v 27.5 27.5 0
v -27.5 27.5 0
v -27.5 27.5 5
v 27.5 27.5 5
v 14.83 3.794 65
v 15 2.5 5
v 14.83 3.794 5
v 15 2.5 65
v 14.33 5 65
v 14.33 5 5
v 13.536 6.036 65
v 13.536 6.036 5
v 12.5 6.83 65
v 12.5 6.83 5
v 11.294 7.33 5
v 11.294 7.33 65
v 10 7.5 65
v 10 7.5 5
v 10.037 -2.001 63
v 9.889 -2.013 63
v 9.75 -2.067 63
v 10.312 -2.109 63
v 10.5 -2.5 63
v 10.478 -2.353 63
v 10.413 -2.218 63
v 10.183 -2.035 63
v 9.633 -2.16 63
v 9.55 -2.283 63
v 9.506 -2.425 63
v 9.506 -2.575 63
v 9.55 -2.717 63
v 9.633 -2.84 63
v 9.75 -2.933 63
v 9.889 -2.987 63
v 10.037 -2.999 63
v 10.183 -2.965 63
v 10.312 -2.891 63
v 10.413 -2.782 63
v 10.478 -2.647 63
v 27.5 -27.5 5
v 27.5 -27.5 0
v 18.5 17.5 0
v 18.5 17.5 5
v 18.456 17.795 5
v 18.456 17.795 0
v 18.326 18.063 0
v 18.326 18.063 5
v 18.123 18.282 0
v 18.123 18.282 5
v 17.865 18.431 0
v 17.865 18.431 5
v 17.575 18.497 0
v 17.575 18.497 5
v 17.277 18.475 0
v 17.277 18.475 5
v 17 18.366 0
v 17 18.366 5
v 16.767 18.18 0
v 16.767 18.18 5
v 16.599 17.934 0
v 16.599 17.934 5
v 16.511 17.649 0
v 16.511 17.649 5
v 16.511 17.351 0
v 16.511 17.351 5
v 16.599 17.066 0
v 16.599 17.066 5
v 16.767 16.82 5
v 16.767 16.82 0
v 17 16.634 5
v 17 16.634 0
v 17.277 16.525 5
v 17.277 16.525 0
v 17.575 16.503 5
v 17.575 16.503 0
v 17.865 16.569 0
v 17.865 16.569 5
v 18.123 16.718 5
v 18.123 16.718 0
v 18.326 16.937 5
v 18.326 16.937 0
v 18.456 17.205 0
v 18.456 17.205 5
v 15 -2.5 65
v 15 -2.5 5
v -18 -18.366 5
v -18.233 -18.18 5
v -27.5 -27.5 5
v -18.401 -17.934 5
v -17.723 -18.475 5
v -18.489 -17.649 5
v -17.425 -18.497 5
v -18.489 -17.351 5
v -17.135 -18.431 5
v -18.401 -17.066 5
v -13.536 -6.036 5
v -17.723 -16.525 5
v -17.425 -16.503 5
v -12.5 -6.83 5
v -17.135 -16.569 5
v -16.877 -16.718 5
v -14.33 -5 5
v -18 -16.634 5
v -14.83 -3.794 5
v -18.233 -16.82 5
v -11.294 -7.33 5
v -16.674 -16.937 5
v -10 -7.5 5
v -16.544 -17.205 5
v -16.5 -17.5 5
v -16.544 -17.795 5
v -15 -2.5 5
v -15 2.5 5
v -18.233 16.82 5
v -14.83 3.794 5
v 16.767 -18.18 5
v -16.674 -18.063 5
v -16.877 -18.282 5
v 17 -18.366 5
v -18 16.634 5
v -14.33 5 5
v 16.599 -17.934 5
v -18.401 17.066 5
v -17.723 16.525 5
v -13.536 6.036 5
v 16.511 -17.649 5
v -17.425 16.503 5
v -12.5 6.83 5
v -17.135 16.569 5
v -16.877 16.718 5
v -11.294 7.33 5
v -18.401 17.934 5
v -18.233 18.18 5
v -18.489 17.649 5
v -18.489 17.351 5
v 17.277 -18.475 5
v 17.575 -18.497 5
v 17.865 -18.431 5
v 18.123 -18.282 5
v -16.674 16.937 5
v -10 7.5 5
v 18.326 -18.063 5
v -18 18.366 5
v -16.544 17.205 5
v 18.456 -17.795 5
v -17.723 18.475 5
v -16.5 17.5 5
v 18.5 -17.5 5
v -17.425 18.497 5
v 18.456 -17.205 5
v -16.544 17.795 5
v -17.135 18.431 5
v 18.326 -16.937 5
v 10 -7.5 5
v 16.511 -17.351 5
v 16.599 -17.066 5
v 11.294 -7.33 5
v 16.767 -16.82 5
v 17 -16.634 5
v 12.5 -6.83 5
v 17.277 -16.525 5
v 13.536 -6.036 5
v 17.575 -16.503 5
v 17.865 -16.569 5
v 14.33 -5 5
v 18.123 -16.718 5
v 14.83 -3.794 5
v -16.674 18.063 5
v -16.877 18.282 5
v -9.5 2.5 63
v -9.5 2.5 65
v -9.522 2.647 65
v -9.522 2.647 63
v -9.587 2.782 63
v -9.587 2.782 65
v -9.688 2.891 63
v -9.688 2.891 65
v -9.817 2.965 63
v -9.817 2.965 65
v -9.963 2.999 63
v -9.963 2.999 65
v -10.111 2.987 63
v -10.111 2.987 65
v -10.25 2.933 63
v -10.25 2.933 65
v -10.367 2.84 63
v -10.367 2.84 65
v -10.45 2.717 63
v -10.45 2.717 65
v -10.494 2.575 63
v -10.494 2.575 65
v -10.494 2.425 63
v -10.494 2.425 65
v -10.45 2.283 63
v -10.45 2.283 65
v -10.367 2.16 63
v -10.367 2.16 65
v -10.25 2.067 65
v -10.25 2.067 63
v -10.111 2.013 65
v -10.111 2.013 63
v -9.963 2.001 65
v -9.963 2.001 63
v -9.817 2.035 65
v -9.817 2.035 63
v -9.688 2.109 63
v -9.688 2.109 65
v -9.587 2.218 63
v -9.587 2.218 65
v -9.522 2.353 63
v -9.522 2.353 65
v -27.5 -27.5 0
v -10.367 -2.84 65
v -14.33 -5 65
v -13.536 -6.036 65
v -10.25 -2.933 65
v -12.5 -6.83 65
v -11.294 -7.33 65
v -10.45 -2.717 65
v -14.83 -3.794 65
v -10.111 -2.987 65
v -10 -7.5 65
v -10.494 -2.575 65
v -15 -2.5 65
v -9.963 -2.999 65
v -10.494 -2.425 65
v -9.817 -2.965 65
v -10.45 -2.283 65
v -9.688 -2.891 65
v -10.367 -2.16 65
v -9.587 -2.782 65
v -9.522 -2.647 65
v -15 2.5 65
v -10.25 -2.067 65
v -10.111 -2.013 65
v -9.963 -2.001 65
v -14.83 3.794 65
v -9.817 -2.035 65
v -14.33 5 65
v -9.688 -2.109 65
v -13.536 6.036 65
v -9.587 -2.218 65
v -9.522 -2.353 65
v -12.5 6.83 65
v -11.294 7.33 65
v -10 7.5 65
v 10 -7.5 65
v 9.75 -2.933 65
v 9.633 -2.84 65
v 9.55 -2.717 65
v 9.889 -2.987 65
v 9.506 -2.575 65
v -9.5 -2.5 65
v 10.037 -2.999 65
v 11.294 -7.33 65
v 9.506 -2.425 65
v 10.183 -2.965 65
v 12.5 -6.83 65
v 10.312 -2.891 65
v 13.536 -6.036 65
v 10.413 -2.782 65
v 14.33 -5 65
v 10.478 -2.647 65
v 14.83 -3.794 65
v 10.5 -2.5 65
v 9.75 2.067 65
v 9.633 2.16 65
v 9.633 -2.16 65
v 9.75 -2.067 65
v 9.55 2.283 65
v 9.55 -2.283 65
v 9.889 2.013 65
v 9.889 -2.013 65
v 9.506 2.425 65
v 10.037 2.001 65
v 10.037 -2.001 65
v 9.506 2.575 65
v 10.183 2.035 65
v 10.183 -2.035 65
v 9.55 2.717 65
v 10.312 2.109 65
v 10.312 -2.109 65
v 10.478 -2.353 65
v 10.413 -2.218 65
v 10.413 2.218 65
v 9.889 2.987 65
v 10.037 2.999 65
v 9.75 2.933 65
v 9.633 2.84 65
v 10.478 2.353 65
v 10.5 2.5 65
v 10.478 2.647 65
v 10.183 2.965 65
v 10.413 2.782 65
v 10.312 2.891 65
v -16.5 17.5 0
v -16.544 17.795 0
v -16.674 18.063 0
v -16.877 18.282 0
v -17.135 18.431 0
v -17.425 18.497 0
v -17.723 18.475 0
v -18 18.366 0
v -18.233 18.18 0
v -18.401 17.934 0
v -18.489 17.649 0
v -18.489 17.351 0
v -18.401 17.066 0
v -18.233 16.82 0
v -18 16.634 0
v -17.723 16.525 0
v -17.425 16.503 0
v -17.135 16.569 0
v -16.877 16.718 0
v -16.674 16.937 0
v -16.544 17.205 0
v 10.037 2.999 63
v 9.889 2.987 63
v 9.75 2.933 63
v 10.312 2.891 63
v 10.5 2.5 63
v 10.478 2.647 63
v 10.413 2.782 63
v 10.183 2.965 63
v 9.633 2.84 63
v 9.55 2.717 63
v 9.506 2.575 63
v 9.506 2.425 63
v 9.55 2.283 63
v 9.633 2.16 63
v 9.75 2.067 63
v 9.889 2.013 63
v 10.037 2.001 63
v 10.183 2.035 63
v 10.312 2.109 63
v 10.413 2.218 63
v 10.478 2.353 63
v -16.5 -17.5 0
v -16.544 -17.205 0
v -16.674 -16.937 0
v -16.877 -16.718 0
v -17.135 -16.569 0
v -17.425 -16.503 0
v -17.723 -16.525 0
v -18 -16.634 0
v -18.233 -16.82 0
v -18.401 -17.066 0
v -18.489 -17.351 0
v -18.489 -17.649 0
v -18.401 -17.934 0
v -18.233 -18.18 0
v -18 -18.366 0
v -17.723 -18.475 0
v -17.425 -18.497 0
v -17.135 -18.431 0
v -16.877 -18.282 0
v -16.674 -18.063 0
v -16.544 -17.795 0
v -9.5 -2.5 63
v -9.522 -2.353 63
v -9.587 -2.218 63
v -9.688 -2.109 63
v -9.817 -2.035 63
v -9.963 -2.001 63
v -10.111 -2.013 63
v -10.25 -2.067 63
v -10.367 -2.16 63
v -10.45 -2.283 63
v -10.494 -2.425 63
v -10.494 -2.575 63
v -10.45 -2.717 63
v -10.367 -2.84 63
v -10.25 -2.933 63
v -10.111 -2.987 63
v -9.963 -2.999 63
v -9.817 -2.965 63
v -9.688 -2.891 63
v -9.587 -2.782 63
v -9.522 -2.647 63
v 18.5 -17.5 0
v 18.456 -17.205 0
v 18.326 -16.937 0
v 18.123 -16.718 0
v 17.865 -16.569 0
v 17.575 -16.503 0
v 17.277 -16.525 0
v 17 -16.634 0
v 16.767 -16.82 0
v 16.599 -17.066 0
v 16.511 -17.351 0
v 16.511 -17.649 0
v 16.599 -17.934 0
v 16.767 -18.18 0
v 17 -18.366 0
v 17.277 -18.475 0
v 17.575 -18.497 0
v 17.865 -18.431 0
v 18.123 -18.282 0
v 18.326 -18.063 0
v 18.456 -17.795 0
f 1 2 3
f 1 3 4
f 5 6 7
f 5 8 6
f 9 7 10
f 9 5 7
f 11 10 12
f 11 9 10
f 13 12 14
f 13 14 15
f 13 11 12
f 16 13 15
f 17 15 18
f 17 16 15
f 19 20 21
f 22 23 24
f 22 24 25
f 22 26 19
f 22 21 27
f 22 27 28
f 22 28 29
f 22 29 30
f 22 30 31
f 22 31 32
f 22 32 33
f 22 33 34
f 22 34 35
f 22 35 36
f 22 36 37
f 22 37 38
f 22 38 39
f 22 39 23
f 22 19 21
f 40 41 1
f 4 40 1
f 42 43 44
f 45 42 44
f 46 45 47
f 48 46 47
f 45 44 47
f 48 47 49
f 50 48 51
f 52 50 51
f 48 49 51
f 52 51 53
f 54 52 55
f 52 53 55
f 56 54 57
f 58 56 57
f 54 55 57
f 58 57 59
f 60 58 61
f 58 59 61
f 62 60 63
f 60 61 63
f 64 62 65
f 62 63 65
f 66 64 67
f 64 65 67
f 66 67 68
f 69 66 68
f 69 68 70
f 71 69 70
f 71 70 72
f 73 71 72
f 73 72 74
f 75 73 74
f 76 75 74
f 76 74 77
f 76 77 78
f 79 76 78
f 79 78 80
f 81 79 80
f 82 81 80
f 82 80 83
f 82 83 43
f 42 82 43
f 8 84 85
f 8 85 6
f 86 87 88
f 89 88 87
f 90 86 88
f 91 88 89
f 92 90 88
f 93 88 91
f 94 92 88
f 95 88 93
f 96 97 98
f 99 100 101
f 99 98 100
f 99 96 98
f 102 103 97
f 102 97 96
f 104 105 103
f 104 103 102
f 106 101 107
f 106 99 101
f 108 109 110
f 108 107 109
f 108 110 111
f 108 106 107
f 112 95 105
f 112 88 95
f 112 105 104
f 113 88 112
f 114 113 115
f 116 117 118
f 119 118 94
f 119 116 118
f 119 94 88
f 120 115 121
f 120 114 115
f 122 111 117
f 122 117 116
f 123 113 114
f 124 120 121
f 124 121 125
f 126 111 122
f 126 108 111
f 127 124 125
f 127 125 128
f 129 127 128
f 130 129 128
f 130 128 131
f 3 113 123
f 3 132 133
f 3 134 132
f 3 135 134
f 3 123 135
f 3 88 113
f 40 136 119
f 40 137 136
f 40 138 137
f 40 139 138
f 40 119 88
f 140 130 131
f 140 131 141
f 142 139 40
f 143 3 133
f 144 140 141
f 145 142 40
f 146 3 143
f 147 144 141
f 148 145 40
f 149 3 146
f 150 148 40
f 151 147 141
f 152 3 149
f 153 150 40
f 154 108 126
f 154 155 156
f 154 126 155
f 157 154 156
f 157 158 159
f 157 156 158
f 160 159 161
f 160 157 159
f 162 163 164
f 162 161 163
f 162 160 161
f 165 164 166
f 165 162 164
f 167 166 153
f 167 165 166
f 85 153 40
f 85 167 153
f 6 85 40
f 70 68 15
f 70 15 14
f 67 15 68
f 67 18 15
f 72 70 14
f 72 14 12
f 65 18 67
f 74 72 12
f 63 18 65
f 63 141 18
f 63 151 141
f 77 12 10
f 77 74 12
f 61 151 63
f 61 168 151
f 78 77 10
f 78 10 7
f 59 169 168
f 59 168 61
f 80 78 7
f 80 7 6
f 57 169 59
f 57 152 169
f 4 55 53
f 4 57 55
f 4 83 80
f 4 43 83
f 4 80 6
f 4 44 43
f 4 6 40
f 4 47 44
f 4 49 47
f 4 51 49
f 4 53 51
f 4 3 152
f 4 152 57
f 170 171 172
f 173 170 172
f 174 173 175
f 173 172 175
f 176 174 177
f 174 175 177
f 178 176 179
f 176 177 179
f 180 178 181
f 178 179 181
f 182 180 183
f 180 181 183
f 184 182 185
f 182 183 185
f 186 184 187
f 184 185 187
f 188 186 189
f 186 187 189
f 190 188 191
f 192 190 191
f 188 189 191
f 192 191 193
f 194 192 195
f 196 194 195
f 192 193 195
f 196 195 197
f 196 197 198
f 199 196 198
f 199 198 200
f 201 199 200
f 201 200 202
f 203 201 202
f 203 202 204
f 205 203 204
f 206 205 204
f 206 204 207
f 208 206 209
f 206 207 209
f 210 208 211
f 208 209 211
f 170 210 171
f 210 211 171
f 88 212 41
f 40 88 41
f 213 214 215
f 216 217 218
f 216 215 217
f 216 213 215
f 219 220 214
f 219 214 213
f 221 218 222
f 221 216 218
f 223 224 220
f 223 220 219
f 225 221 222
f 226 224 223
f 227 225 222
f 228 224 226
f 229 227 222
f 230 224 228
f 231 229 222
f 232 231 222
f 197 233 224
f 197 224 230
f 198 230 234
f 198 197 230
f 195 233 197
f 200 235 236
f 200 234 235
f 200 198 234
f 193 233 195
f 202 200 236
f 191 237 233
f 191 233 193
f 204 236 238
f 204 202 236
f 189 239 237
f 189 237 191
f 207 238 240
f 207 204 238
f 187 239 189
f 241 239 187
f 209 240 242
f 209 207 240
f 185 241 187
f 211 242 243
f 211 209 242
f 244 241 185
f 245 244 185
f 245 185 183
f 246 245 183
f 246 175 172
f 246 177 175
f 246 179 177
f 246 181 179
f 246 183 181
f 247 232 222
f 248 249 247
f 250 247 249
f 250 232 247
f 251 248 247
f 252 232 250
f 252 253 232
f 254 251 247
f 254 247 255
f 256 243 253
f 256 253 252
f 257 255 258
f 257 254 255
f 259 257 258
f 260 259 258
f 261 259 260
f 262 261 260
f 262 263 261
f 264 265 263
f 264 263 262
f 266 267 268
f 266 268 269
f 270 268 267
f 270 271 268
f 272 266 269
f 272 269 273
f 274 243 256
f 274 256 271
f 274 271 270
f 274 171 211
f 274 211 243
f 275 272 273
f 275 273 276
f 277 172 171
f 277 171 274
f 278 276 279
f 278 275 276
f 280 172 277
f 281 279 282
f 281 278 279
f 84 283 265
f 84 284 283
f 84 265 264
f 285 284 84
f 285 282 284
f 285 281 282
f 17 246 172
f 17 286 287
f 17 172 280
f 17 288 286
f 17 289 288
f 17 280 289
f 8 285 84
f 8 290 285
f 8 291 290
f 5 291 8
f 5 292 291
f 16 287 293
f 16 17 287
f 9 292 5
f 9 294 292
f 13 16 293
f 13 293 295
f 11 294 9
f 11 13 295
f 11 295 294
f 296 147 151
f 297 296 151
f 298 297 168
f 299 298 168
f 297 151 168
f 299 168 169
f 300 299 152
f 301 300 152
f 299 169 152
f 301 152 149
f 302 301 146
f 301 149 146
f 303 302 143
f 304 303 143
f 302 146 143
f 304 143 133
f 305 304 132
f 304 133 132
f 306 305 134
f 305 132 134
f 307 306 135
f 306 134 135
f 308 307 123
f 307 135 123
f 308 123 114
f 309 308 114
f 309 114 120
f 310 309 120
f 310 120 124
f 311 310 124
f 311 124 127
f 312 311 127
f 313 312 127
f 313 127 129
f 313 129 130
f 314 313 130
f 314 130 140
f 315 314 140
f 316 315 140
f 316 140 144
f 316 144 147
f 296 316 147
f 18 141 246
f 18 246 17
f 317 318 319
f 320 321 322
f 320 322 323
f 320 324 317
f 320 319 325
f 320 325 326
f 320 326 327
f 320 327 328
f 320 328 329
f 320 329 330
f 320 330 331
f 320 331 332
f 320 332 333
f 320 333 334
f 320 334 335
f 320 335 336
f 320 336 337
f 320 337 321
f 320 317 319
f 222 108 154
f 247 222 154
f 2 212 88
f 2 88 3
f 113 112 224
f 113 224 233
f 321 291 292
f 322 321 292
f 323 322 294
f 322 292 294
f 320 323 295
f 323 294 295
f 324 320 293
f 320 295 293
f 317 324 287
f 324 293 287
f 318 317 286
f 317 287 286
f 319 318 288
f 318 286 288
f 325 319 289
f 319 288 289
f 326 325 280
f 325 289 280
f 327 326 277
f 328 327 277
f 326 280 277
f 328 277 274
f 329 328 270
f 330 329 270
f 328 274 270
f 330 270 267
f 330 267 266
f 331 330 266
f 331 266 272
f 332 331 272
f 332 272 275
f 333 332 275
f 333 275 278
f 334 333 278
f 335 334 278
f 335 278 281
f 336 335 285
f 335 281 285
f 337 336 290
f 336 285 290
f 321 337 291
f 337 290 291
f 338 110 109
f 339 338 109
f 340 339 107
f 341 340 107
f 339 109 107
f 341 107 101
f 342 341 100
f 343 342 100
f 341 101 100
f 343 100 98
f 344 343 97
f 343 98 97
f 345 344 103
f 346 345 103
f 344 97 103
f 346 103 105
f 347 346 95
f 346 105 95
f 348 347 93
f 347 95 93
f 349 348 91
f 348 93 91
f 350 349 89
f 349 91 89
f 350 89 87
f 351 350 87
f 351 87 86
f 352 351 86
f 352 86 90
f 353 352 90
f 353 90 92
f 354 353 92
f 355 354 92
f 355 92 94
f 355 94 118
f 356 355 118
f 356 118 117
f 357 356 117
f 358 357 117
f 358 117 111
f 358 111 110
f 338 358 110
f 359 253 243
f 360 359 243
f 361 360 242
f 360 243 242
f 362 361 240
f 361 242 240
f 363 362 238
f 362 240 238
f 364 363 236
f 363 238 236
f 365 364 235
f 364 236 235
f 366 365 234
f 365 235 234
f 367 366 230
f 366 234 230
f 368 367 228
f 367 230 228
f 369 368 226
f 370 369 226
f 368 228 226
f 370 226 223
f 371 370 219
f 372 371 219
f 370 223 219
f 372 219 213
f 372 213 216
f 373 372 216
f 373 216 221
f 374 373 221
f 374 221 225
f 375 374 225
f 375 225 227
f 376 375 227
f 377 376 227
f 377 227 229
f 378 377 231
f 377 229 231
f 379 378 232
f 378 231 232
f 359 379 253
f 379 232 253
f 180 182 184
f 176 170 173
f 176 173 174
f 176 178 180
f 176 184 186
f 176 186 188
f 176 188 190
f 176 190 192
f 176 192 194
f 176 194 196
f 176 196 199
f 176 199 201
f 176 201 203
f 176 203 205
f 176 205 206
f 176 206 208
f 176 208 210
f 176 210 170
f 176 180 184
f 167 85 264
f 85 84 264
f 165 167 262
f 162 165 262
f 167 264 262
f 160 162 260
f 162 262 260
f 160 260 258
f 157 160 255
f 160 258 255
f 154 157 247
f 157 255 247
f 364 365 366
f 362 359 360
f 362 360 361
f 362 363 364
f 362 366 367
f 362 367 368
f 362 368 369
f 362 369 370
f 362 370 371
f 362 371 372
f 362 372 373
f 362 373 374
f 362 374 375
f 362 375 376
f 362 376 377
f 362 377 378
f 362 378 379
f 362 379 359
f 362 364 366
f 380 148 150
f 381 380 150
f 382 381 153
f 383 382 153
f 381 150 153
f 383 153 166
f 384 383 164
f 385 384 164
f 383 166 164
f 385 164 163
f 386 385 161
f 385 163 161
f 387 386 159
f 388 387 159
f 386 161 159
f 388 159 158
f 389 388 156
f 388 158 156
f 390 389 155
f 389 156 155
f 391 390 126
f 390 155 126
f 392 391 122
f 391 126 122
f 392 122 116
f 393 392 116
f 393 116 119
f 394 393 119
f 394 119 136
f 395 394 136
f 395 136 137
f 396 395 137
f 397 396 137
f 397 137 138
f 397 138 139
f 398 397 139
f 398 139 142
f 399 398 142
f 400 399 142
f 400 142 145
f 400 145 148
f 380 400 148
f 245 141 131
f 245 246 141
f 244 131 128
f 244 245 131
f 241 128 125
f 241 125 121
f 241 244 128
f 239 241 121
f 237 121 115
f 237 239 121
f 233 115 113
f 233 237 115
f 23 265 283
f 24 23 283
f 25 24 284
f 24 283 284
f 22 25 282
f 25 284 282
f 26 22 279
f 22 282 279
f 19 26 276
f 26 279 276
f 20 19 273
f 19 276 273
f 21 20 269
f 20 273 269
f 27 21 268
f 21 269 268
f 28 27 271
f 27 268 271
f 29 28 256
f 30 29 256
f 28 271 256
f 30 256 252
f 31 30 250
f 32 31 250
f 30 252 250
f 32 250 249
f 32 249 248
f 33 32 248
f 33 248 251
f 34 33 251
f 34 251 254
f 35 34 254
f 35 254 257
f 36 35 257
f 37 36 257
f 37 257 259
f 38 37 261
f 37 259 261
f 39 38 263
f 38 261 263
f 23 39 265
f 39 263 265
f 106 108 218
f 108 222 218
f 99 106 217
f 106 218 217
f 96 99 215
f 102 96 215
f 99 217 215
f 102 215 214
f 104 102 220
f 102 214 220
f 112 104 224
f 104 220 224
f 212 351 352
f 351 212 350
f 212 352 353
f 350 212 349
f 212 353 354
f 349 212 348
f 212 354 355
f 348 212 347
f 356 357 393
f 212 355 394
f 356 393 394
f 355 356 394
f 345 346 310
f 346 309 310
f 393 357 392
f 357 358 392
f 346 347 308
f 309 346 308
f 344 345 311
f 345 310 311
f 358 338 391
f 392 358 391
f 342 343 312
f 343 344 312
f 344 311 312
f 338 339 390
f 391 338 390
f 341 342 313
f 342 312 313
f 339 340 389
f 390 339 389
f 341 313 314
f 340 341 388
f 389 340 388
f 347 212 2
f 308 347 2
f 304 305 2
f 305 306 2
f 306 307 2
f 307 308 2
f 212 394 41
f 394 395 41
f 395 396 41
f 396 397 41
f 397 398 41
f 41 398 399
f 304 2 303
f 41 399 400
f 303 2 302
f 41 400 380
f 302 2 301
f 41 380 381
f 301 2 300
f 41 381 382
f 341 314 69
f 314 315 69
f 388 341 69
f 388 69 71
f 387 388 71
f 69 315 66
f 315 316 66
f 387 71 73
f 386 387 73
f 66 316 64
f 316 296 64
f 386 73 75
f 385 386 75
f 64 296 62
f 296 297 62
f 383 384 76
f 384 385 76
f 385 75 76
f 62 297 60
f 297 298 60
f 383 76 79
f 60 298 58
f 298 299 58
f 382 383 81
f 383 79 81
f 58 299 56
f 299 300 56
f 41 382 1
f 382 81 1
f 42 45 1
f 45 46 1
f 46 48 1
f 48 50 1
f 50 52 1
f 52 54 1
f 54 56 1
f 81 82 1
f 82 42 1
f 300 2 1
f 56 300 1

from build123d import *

# Parameters (mm, degrees)
ESQUISSE1_W             = 55
ESQUISSE1_H             = 55
BOSS_EXTRU_1_DEPTH      = 5
ESQUISSE2_W             = 30
ESQUISSE2_H             = 15
BOSS_EXTRU_2_DEPTH      = 60
CONG_2_R                = 5
CONG_3_R                = 5
CONG_4_R                = 5
CONG_5_R                = 5
ENL_V_MAT_EXTRU_1_REACH = 7
ESQUISSE3_R             = 1
ESQUISSE4_R             = 0.5
ENL_V_MAT_EXTRU_2_DEPTH = 2


with BuildPart() as part:
    # Esquisse1 → Boss.-Extru.1 (new body)
    with BuildSketch(Plane.XY):
        Rectangle(ESQUISSE1_W, ESQUISSE1_H)
    extrude(amount=BOSS_EXTRU_1_DEPTH)

    # Esquisse2 → Boss.-Extru.2 (add)
    with BuildSketch(Plane.XY.offset(5)):
        Rectangle(ESQUISSE2_W, ESQUISSE2_H)
    extrude(amount=BOSS_EXTRU_2_DEPTH)

    # Congé2
    cong_2_edges = [part.edges().sort_by_distance(p)[0] for p in [
        (-15, -7.5, 35),
    ]]
    fillet(cong_2_edges, radius=CONG_2_R)

    # Congé3
    cong_3_edges = [part.edges().sort_by_distance(p)[0] for p in [
        (15, 7.5, 35),
    ]]
    fillet(cong_3_edges, radius=CONG_3_R)

    # Congé4
    cong_4_edges = [part.edges().sort_by_distance(p)[0] for p in [
        (15, -7.5, 35),
    ]]
    fillet(cong_4_edges, radius=CONG_4_R)

    # Congé5
    cong_5_edges = [part.edges().sort_by_distance(p)[0] for p in [
        (-15, 7.5, 35),
    ]]
    fillet(cong_5_edges, radius=CONG_5_R)

    # Esquisse3 → Enlèv. mat.-Extru.1 (cut, up to next)
    with BuildSketch(Plane.XY.offset(5), mode=Mode.PRIVATE) as enl_v_mat_extru_1_sk1:
        with Locations((17.5, 17.5)):
            Circle(ESQUISSE3_R)
    enl_v_mat_extru_1_tool1 = extrude(enl_v_mat_extru_1_sk1.sketch, amount=-ENL_V_MAT_EXTRU_1_REACH, mode=Mode.PRIVATE) & part.part
    add(enl_v_mat_extru_1_tool1.solids().sort_by_distance((17.5, 17.5, 5))[0], mode=Mode.SUBTRACT)
    # Esquisse3 → Enlèv. mat.-Extru.1 (cut, up to next)
    with BuildSketch(Plane.XY.offset(5), mode=Mode.PRIVATE) as enl_v_mat_extru_1_sk2:
        with Locations((-17.5, 17.5)):
            Circle(ESQUISSE3_R)
    enl_v_mat_extru_1_tool2 = extrude(enl_v_mat_extru_1_sk2.sketch, amount=-ENL_V_MAT_EXTRU_1_REACH, mode=Mode.PRIVATE) & part.part
    add(enl_v_mat_extru_1_tool2.solids().sort_by_distance((-17.5, 17.5, 5))[0], mode=Mode.SUBTRACT)
    # Esquisse3 → Enlèv. mat.-Extru.1 (cut, up to next)
    with BuildSketch(Plane.XY.offset(5), mode=Mode.PRIVATE) as enl_v_mat_extru_1_sk3:
        with Locations((-17.5, -17.5)):
            Circle(ESQUISSE3_R)
    enl_v_mat_extru_1_tool3 = extrude(enl_v_mat_extru_1_sk3.sketch, amount=-ENL_V_MAT_EXTRU_1_REACH, mode=Mode.PRIVATE) & part.part
    add(enl_v_mat_extru_1_tool3.solids().sort_by_distance((-17.5, -17.5, 5))[0], mode=Mode.SUBTRACT)
    # Esquisse3 → Enlèv. mat.-Extru.1 (cut, up to next)
    with BuildSketch(Plane.XY.offset(5), mode=Mode.PRIVATE) as enl_v_mat_extru_1_sk4:
        with Locations((17.5, -17.5)):
            Circle(ESQUISSE3_R)
    enl_v_mat_extru_1_tool4 = extrude(enl_v_mat_extru_1_sk4.sketch, amount=-ENL_V_MAT_EXTRU_1_REACH, mode=Mode.PRIVATE) & part.part
    add(enl_v_mat_extru_1_tool4.solids().sort_by_distance((17.5, -17.5, 5))[0], mode=Mode.SUBTRACT)

    # Esquisse4 → Enlèv. mat.-Extru.2 (cut)
    with BuildSketch(Plane.XY.offset(65)):
        with Locations((10, -2.5)):
            Circle(ESQUISSE4_R)
        with Locations((10, 2.5)):
            Circle(ESQUISSE4_R)
        with Locations((-10, 2.5)):
            Circle(ESQUISSE4_R)
        with Locations((-10, -2.5)):
            Circle(ESQUISSE4_R)
    extrude(amount=-ENL_V_MAT_EXTRU_2_DEPTH, mode=Mode.SUBTRACT)


solid = part.part
